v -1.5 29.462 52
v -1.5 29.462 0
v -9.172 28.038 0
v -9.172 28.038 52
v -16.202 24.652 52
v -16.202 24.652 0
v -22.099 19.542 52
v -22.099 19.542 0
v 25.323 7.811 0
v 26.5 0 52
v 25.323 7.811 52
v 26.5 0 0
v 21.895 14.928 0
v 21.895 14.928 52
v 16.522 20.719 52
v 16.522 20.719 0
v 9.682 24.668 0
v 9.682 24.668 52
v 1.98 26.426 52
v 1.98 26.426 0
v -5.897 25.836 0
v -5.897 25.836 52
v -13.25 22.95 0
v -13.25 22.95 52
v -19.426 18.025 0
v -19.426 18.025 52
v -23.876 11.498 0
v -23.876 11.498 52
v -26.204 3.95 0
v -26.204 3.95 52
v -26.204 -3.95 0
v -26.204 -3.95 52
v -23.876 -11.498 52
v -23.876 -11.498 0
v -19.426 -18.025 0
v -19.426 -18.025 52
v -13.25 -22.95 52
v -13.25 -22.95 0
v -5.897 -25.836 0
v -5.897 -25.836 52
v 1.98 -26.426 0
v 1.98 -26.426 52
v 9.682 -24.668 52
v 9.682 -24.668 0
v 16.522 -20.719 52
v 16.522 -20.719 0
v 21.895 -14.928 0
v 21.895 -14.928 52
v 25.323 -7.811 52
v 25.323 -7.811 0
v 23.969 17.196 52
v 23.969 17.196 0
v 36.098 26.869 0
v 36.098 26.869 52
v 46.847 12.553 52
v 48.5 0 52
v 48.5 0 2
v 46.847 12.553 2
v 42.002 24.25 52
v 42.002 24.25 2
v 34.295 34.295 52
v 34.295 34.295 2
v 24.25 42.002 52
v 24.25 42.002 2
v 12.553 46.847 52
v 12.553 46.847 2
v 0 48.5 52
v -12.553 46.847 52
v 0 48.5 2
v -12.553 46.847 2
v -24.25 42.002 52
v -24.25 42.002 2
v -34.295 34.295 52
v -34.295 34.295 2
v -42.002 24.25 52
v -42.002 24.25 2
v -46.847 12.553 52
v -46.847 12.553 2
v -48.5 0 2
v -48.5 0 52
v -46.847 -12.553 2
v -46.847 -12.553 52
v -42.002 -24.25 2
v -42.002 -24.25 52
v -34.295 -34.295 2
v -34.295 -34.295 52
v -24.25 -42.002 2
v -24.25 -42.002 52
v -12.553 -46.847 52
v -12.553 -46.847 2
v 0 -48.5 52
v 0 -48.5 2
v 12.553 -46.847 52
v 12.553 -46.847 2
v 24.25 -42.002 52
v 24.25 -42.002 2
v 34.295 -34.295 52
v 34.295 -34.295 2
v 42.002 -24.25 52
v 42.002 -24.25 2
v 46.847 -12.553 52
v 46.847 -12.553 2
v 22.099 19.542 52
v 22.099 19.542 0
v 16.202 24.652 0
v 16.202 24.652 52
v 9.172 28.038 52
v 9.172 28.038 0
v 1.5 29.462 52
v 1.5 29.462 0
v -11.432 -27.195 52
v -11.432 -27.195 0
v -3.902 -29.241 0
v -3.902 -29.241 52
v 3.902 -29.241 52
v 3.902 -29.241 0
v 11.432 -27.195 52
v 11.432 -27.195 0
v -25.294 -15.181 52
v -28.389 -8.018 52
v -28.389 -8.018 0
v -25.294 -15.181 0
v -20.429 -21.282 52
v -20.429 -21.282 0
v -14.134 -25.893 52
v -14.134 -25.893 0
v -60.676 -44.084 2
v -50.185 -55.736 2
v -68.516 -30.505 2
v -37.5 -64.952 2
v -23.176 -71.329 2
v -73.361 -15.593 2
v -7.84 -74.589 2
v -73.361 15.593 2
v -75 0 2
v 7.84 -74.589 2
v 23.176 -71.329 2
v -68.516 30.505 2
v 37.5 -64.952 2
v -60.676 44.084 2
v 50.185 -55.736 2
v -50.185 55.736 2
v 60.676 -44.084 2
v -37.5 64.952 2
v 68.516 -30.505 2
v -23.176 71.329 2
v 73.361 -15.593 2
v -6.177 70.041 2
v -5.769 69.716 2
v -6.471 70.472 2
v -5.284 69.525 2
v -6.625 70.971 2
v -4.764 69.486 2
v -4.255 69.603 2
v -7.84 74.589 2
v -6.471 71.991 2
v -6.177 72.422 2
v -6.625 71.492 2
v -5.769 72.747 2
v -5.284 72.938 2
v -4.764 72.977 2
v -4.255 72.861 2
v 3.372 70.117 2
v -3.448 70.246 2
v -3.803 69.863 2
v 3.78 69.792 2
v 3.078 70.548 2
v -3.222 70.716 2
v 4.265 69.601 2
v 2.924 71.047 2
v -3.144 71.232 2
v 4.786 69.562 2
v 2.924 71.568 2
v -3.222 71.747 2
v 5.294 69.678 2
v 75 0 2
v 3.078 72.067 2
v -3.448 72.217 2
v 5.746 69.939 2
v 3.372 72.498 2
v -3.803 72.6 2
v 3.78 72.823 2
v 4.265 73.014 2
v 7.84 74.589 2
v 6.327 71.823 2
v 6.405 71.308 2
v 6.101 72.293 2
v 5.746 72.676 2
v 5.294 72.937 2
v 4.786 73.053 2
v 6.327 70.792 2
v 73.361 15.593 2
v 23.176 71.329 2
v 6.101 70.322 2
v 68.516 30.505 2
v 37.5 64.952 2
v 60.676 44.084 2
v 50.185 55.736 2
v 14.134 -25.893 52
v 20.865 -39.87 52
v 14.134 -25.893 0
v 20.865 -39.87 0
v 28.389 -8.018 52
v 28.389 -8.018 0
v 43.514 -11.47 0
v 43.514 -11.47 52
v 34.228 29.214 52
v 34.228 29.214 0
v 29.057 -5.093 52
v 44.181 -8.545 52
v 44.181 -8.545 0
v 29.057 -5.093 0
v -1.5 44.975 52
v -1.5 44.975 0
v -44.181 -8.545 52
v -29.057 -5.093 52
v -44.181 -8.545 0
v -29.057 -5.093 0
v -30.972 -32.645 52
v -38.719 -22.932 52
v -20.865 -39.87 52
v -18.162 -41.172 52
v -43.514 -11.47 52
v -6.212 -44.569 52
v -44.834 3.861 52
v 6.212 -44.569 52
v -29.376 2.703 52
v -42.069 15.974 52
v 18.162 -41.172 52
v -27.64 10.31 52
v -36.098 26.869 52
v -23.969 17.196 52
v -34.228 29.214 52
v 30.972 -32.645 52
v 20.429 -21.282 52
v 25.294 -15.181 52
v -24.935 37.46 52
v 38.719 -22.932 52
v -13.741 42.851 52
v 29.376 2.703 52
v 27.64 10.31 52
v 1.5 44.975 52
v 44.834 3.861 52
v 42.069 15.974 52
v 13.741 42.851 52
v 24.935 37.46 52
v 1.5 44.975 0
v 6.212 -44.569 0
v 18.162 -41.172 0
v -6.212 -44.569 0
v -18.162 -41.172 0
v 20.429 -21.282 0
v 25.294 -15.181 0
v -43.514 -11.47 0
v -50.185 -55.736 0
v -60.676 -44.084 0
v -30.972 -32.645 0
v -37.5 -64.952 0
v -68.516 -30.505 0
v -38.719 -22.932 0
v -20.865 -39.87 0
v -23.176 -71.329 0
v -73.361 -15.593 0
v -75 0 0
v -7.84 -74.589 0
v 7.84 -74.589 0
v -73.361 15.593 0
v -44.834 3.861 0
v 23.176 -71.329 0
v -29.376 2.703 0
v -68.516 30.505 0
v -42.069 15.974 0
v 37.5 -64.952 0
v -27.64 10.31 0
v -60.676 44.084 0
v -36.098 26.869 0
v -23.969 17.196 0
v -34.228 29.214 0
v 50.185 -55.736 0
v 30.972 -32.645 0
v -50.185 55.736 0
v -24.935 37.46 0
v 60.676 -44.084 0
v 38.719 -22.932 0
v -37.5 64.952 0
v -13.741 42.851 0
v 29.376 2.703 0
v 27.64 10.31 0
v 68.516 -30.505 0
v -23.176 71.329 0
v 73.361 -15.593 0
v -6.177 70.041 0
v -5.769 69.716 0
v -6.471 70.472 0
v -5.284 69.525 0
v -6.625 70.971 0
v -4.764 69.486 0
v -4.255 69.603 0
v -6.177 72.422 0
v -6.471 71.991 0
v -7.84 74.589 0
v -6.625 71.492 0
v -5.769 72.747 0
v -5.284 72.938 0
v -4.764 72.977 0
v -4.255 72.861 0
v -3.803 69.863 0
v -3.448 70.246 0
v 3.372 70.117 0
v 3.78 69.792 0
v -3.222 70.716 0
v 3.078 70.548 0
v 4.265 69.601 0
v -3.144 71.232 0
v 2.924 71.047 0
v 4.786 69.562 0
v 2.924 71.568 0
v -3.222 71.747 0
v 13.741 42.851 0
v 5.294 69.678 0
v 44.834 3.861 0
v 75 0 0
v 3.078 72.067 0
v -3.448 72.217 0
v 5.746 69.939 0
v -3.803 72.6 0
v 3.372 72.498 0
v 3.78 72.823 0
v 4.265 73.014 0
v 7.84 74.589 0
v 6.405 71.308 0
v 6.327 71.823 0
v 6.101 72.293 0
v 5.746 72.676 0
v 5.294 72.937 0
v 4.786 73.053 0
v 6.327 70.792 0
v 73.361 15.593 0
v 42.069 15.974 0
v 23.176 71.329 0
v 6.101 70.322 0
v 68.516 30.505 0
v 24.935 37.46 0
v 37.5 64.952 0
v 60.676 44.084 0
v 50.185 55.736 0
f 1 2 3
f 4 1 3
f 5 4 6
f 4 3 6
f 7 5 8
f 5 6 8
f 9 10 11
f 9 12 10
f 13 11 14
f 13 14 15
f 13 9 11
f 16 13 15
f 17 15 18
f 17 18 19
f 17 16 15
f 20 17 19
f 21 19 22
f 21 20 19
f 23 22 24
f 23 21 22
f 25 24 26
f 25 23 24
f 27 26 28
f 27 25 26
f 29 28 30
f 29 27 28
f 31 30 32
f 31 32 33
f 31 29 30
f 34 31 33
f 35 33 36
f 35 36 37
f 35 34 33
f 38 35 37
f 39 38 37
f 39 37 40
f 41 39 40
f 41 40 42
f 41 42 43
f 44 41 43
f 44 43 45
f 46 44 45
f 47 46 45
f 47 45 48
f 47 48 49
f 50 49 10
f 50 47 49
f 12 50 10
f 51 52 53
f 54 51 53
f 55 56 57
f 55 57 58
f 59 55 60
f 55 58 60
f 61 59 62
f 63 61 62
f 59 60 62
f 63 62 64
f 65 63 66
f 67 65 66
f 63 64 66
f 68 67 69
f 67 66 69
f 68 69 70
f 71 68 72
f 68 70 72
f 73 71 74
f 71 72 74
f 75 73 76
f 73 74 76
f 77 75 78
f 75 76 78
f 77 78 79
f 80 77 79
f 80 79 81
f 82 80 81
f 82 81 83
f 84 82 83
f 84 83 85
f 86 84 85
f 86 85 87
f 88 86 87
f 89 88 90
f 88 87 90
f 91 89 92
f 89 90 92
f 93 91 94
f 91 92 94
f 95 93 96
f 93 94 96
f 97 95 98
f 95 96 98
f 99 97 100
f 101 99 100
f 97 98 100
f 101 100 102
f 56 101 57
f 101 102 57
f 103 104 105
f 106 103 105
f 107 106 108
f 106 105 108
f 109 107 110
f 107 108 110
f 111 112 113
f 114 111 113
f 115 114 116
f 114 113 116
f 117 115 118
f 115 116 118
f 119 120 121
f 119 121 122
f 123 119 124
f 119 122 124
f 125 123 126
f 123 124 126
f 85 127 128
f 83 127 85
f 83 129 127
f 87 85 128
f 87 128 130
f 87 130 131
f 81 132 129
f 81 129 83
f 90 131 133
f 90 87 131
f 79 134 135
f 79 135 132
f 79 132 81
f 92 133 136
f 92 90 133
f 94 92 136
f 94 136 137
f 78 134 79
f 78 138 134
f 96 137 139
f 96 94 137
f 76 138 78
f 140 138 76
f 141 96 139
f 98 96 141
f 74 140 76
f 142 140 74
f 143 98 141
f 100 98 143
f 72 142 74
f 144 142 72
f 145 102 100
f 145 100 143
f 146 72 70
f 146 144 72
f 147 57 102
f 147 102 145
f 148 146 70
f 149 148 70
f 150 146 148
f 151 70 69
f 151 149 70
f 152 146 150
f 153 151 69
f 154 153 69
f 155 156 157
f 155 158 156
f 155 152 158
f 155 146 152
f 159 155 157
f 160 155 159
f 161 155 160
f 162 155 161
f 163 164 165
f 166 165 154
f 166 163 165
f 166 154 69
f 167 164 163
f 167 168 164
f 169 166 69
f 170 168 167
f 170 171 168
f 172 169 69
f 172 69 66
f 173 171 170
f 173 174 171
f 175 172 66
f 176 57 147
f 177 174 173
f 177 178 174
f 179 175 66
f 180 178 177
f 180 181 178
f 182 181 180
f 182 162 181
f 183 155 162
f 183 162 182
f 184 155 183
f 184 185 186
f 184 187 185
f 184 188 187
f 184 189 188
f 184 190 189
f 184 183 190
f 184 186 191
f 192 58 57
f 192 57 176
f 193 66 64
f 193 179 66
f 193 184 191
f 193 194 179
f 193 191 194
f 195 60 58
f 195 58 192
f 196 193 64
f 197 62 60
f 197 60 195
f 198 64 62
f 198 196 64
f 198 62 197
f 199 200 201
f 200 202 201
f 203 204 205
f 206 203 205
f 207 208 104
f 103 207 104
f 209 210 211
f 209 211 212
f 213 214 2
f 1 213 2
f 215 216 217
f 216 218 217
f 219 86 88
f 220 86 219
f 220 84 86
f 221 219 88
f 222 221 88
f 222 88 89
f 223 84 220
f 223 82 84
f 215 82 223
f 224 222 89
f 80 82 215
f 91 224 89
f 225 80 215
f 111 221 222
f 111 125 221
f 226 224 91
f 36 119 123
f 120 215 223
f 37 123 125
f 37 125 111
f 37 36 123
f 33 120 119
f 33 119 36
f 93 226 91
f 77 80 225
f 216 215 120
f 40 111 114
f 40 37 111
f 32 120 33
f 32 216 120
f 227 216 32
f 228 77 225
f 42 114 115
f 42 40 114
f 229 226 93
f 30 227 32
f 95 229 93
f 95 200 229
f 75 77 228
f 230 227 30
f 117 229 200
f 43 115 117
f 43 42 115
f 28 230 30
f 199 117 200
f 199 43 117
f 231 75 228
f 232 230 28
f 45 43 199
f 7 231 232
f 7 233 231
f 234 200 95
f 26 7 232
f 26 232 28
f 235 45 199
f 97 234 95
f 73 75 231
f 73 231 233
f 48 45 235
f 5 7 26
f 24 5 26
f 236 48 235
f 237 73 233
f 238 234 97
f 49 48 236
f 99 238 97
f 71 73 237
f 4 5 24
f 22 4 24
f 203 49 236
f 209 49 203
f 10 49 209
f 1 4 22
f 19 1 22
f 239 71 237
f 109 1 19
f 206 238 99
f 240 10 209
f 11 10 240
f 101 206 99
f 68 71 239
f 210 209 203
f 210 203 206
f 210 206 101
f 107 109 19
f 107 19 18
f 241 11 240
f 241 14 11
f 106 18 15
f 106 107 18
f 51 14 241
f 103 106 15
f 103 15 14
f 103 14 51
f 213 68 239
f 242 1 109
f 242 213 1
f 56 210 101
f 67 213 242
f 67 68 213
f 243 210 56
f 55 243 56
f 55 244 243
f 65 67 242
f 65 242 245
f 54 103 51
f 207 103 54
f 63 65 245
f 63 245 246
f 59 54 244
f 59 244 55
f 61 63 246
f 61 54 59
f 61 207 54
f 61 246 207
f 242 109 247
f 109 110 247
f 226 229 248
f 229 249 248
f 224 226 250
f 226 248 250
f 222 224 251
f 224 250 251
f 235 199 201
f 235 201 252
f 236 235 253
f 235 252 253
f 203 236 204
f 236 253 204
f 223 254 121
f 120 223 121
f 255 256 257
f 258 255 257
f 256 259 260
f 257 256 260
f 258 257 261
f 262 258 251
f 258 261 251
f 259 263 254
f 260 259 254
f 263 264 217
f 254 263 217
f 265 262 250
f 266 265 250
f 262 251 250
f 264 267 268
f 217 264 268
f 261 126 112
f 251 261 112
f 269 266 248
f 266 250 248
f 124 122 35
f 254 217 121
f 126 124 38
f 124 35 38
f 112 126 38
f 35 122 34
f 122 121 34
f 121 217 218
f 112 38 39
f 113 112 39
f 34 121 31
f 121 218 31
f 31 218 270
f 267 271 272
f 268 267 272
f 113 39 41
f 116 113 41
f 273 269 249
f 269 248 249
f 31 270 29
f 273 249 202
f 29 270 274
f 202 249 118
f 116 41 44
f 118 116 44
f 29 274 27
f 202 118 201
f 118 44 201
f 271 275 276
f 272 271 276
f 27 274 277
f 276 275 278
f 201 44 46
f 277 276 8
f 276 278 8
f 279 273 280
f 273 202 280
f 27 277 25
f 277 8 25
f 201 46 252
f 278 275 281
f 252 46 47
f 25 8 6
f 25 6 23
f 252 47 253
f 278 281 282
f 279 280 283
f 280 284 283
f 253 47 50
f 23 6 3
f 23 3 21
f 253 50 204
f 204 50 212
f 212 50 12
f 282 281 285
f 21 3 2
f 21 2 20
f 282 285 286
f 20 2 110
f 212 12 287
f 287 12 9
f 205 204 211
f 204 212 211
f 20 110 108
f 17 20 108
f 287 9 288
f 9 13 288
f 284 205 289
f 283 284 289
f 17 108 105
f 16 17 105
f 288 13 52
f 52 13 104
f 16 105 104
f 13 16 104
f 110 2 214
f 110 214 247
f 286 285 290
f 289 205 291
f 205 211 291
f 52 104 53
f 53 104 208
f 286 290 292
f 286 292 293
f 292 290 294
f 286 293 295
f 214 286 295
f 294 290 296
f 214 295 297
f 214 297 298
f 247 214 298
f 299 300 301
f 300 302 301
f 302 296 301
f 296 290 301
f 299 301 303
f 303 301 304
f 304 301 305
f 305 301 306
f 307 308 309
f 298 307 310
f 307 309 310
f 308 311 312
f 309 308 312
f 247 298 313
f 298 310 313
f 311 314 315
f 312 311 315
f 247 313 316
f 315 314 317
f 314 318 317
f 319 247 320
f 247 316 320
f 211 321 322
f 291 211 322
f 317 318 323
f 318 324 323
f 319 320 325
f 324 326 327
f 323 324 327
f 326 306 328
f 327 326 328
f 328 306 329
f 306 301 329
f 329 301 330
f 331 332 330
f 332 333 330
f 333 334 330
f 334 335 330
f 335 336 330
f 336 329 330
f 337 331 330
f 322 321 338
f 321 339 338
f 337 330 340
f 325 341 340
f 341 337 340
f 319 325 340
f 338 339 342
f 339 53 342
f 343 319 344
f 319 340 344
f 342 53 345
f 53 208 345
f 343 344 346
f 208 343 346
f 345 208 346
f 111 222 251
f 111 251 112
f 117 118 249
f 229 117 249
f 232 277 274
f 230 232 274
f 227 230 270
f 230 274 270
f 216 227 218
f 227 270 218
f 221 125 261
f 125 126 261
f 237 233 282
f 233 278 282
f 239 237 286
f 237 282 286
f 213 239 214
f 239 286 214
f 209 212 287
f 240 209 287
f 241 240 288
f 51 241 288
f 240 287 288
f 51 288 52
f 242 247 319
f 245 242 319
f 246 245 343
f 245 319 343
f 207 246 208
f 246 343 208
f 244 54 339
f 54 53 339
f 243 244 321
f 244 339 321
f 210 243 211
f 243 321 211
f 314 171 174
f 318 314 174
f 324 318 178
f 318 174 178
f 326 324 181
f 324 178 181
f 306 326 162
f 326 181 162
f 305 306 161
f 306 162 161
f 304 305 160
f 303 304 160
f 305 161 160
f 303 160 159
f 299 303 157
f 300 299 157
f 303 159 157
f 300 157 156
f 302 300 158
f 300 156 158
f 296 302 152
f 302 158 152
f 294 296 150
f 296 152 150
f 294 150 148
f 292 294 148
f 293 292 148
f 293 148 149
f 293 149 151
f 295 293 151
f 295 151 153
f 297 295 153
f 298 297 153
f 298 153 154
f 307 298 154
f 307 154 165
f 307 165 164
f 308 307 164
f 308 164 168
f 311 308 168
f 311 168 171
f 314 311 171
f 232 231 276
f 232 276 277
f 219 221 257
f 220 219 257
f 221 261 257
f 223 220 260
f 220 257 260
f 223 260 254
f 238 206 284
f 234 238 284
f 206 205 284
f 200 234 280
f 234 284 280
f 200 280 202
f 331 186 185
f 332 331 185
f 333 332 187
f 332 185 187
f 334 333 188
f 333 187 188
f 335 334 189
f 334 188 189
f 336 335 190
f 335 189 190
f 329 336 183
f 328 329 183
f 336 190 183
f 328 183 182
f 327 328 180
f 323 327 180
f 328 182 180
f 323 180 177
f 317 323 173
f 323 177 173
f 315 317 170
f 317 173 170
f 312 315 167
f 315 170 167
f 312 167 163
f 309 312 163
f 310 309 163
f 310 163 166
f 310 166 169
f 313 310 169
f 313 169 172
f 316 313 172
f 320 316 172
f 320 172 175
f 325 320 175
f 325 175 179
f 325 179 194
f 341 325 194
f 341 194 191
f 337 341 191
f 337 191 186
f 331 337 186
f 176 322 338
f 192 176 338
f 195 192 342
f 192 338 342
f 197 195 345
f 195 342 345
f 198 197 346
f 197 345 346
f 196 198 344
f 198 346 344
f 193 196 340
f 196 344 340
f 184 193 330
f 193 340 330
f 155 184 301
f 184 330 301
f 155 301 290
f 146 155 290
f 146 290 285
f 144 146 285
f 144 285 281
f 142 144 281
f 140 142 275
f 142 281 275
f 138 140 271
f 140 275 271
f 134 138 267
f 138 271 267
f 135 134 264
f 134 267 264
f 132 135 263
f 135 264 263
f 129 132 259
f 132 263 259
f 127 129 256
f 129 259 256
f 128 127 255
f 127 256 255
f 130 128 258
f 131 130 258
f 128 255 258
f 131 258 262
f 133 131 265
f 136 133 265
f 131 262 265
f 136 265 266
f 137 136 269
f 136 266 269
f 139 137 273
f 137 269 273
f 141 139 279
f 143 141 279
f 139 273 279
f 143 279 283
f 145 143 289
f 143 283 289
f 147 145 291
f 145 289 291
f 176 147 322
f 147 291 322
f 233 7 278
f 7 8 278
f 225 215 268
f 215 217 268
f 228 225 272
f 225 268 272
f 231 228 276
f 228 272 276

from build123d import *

# Parameters (mm, degrees)
F0_R     = 75
F0_R_2   = 26.5
F1_DEPTH = 2
F2_R     = 48.5
F2_R_2   = 26.5
F3_DEPTH = 50
F4_R     = 1.75
F5_DEPTH = 2.001


with BuildPart() as f1:
    # F0 (on Top) → F1 (new body)
    with BuildSketch(Plane.XY):
        Circle(F0_R)
        with BuildLine():
            Line((-43.513595, -11.470269), (-28.389388, -8.018268))
            ThreePointArc((-28.389388, -8.018268), (-23.064029, -18.392949), (-14.134466, -25.893375))
            Line((-14.134466, -25.893375), (-20.865371, -39.870243))
            ThreePointArc((-20.865371, -39.870243), (-35.182417, -28.057041), (-43.513595, -11.470269))
        make_face(mode=Mode.SUBTRACT)
        with BuildLine():
            Line((-18.162465, -41.171894), (-11.43156, -27.195026))
            ThreePointArc((-11.43156, -27.195026), (0, -29.5), (11.43156, -27.195026))
            Line((11.43156, -27.195026), (18.162465, -41.171894))
            ThreePointArc((18.162465, -41.171894), (0, -45), (-18.162465, -41.171894))
        make_face(mode=Mode.SUBTRACT)
        with BuildLine():
            Line((20.865371, -39.870243), (14.134466, -25.893375))
            ThreePointArc((14.134466, -25.893375), (23.064029, -18.392949), (28.389388, -8.018268))
            Line((28.389388, -8.018268), (43.513595, -11.470269))
            ThreePointArc((43.513595, -11.470269), (35.182417, -28.057041), (20.865371, -39.870243))
        make_face(mode=Mode.SUBTRACT)
        with BuildLine():
            Line((-36.0981, 26.868702), (-23.969429, 17.196409))
            ThreePointArc((-23.969429, 17.196409), (-28.760373, 6.564368), (-29.056951, -5.093484))
            Line((-29.056951, -5.093484), (-44.181157, -8.545486))
            ThreePointArc((-44.181157, -8.545486), (-43.871756, 10.013442), (-36.0981, 26.868702))
        make_face(mode=Mode.SUBTRACT)
        with BuildLine():
            Line((-1.5, 44.974993), (-1.5, 29.46184))
            ThreePointArc((-1.5, 29.46184), (-12.79957, 26.578582), (-22.098959, 19.541904))
            Line((-22.098959, 19.541904), (-34.227631, 29.214197))
            ThreePointArc((-34.227631, 29.214197), (-19.524768, 40.543599), (-1.5, 44.974993))
        make_face(mode=Mode.SUBTRACT)
        Circle(F0_R_2, mode=Mode.SUBTRACT)
        with BuildLine():
            Line((44.181157, -8.545486), (29.056951, -5.093484))
            ThreePointArc((29.056951, -5.093484), (28.760373, 6.564368), (23.969429, 17.196409))
            Line((23.969429, 17.196409), (36.0981, 26.868702))
            ThreePointArc((36.0981, 26.868702), (43.871756, 10.013442), (44.181157, -8.545486))
        make_face(mode=Mode.SUBTRACT)
        with BuildLine():
            ThreePointArc((22.098959, 19.541904), (12.79957, 26.578582), (1.5, 29.46184))
            Line((1.5, 29.46184), (1.5, 44.974993))
            ThreePointArc((1.5, 44.974993), (19.524768, 40.543599), (34.227631, 29.214197))
            Line((34.227631, 29.214197), (22.098959, 19.541904))
        make_face(mode=Mode.SUBTRACT)
    extrude(amount=F1_DEPTH)

    # F2 (on face) → F3 (join)
    with BuildSketch(Plane.XY.offset(2)):
        Circle(F2_R)
        with BuildLine():
            Line((-14.134466, -25.893375), (-20.865371, -39.870243))
            ThreePointArc((-20.865371, -39.870243), (-35.182417, -28.057041), (-43.513595, -11.470269))
            Line((-43.513595, -11.470269), (-28.389388, -8.018268))
            ThreePointArc((-28.389388, -8.018268), (-23.064029, -18.392949), (-14.134466, -25.893375))
        make_face(mode=Mode.SUBTRACT)
        with BuildLine():
            ThreePointArc((18.162465, -41.171894), (0, -45), (-18.162465, -41.171894))
            Line((-18.162465, -41.171894), (-11.43156, -27.195026))
            ThreePointArc((-11.43156, -27.195026), (0, -29.5), (11.43156, -27.195026))
            Line((11.43156, -27.195026), (18.162465, -41.171894))
        make_face(mode=Mode.SUBTRACT)
        with BuildLine():
            ThreePointArc((43.513595, -11.470269), (35.182417, -28.057041), (20.865371, -39.870243))
            Line((20.865371, -39.870243), (14.134466, -25.893375))
            ThreePointArc((14.134466, -25.893375), (23.064029, -18.392949), (28.389388, -8.018268))
            Line((28.389388, -8.018268), (43.513595, -11.470269))
        make_face(mode=Mode.SUBTRACT)
        with BuildLine():
            Line((-29.056951, -5.093484), (-44.181157, -8.545486))
            ThreePointArc((-44.181157, -8.545486), (-43.871756, 10.013442), (-36.0981, 26.868702))
            Line((-36.0981, 26.868702), (-23.969429, 17.196409))
            ThreePointArc((-23.969429, 17.196409), (-28.760373, 6.564368), (-29.056951, -5.093484))
        make_face(mode=Mode.SUBTRACT)
        with BuildLine():
            Line((-22.098959, 19.541904), (-34.227631, 29.214197))
            ThreePointArc((-34.227631, 29.214197), (-19.524768, 40.543599), (-1.5, 44.974993))
            Line((-1.5, 44.974993), (-1.5, 29.46184))
            ThreePointArc((-1.5, 29.46184), (-12.79957, 26.578582), (-22.098959, 19.541904))
        make_face(mode=Mode.SUBTRACT)
        Circle(F2_R_2, mode=Mode.SUBTRACT)
        with BuildLine():
            ThreePointArc((36.0981, 26.868702), (43.871756, 10.013442), (44.181157, -8.545486))
            Line((44.181157, -8.545486), (29.056951, -5.093484))
            ThreePointArc((29.056951, -5.093484), (28.760373, 6.564368), (23.969429, 17.196409))
            Line((23.969429, 17.196409), (36.0981, 26.868702))
        make_face(mode=Mode.SUBTRACT)
        with BuildLine():
            Line((1.5, 29.46184), (1.5, 44.974993))
            ThreePointArc((1.5, 44.974993), (19.524768, 40.543599), (34.227631, 29.214197))
            Line((34.227631, 29.214197), (22.098959, 19.541904))
            ThreePointArc((22.098959, 19.541904), (12.79957, 26.578582), (1.5, 29.46184))
        make_face(mode=Mode.SUBTRACT)
    extrude(amount=F3_DEPTH)

    # F4 (on face) → F5 (cut, through all)
    with BuildSketch(Plane.XY.offset(2)):
        with Locations((-4.894284, 71.231538)):
            Circle(F4_R)
        with Locations((4.654726, 71.307522)):
            Circle(F4_R)
    extrude(amount=-F5_DEPTH, mode=Mode.SUBTRACT)


solid = f1.part
